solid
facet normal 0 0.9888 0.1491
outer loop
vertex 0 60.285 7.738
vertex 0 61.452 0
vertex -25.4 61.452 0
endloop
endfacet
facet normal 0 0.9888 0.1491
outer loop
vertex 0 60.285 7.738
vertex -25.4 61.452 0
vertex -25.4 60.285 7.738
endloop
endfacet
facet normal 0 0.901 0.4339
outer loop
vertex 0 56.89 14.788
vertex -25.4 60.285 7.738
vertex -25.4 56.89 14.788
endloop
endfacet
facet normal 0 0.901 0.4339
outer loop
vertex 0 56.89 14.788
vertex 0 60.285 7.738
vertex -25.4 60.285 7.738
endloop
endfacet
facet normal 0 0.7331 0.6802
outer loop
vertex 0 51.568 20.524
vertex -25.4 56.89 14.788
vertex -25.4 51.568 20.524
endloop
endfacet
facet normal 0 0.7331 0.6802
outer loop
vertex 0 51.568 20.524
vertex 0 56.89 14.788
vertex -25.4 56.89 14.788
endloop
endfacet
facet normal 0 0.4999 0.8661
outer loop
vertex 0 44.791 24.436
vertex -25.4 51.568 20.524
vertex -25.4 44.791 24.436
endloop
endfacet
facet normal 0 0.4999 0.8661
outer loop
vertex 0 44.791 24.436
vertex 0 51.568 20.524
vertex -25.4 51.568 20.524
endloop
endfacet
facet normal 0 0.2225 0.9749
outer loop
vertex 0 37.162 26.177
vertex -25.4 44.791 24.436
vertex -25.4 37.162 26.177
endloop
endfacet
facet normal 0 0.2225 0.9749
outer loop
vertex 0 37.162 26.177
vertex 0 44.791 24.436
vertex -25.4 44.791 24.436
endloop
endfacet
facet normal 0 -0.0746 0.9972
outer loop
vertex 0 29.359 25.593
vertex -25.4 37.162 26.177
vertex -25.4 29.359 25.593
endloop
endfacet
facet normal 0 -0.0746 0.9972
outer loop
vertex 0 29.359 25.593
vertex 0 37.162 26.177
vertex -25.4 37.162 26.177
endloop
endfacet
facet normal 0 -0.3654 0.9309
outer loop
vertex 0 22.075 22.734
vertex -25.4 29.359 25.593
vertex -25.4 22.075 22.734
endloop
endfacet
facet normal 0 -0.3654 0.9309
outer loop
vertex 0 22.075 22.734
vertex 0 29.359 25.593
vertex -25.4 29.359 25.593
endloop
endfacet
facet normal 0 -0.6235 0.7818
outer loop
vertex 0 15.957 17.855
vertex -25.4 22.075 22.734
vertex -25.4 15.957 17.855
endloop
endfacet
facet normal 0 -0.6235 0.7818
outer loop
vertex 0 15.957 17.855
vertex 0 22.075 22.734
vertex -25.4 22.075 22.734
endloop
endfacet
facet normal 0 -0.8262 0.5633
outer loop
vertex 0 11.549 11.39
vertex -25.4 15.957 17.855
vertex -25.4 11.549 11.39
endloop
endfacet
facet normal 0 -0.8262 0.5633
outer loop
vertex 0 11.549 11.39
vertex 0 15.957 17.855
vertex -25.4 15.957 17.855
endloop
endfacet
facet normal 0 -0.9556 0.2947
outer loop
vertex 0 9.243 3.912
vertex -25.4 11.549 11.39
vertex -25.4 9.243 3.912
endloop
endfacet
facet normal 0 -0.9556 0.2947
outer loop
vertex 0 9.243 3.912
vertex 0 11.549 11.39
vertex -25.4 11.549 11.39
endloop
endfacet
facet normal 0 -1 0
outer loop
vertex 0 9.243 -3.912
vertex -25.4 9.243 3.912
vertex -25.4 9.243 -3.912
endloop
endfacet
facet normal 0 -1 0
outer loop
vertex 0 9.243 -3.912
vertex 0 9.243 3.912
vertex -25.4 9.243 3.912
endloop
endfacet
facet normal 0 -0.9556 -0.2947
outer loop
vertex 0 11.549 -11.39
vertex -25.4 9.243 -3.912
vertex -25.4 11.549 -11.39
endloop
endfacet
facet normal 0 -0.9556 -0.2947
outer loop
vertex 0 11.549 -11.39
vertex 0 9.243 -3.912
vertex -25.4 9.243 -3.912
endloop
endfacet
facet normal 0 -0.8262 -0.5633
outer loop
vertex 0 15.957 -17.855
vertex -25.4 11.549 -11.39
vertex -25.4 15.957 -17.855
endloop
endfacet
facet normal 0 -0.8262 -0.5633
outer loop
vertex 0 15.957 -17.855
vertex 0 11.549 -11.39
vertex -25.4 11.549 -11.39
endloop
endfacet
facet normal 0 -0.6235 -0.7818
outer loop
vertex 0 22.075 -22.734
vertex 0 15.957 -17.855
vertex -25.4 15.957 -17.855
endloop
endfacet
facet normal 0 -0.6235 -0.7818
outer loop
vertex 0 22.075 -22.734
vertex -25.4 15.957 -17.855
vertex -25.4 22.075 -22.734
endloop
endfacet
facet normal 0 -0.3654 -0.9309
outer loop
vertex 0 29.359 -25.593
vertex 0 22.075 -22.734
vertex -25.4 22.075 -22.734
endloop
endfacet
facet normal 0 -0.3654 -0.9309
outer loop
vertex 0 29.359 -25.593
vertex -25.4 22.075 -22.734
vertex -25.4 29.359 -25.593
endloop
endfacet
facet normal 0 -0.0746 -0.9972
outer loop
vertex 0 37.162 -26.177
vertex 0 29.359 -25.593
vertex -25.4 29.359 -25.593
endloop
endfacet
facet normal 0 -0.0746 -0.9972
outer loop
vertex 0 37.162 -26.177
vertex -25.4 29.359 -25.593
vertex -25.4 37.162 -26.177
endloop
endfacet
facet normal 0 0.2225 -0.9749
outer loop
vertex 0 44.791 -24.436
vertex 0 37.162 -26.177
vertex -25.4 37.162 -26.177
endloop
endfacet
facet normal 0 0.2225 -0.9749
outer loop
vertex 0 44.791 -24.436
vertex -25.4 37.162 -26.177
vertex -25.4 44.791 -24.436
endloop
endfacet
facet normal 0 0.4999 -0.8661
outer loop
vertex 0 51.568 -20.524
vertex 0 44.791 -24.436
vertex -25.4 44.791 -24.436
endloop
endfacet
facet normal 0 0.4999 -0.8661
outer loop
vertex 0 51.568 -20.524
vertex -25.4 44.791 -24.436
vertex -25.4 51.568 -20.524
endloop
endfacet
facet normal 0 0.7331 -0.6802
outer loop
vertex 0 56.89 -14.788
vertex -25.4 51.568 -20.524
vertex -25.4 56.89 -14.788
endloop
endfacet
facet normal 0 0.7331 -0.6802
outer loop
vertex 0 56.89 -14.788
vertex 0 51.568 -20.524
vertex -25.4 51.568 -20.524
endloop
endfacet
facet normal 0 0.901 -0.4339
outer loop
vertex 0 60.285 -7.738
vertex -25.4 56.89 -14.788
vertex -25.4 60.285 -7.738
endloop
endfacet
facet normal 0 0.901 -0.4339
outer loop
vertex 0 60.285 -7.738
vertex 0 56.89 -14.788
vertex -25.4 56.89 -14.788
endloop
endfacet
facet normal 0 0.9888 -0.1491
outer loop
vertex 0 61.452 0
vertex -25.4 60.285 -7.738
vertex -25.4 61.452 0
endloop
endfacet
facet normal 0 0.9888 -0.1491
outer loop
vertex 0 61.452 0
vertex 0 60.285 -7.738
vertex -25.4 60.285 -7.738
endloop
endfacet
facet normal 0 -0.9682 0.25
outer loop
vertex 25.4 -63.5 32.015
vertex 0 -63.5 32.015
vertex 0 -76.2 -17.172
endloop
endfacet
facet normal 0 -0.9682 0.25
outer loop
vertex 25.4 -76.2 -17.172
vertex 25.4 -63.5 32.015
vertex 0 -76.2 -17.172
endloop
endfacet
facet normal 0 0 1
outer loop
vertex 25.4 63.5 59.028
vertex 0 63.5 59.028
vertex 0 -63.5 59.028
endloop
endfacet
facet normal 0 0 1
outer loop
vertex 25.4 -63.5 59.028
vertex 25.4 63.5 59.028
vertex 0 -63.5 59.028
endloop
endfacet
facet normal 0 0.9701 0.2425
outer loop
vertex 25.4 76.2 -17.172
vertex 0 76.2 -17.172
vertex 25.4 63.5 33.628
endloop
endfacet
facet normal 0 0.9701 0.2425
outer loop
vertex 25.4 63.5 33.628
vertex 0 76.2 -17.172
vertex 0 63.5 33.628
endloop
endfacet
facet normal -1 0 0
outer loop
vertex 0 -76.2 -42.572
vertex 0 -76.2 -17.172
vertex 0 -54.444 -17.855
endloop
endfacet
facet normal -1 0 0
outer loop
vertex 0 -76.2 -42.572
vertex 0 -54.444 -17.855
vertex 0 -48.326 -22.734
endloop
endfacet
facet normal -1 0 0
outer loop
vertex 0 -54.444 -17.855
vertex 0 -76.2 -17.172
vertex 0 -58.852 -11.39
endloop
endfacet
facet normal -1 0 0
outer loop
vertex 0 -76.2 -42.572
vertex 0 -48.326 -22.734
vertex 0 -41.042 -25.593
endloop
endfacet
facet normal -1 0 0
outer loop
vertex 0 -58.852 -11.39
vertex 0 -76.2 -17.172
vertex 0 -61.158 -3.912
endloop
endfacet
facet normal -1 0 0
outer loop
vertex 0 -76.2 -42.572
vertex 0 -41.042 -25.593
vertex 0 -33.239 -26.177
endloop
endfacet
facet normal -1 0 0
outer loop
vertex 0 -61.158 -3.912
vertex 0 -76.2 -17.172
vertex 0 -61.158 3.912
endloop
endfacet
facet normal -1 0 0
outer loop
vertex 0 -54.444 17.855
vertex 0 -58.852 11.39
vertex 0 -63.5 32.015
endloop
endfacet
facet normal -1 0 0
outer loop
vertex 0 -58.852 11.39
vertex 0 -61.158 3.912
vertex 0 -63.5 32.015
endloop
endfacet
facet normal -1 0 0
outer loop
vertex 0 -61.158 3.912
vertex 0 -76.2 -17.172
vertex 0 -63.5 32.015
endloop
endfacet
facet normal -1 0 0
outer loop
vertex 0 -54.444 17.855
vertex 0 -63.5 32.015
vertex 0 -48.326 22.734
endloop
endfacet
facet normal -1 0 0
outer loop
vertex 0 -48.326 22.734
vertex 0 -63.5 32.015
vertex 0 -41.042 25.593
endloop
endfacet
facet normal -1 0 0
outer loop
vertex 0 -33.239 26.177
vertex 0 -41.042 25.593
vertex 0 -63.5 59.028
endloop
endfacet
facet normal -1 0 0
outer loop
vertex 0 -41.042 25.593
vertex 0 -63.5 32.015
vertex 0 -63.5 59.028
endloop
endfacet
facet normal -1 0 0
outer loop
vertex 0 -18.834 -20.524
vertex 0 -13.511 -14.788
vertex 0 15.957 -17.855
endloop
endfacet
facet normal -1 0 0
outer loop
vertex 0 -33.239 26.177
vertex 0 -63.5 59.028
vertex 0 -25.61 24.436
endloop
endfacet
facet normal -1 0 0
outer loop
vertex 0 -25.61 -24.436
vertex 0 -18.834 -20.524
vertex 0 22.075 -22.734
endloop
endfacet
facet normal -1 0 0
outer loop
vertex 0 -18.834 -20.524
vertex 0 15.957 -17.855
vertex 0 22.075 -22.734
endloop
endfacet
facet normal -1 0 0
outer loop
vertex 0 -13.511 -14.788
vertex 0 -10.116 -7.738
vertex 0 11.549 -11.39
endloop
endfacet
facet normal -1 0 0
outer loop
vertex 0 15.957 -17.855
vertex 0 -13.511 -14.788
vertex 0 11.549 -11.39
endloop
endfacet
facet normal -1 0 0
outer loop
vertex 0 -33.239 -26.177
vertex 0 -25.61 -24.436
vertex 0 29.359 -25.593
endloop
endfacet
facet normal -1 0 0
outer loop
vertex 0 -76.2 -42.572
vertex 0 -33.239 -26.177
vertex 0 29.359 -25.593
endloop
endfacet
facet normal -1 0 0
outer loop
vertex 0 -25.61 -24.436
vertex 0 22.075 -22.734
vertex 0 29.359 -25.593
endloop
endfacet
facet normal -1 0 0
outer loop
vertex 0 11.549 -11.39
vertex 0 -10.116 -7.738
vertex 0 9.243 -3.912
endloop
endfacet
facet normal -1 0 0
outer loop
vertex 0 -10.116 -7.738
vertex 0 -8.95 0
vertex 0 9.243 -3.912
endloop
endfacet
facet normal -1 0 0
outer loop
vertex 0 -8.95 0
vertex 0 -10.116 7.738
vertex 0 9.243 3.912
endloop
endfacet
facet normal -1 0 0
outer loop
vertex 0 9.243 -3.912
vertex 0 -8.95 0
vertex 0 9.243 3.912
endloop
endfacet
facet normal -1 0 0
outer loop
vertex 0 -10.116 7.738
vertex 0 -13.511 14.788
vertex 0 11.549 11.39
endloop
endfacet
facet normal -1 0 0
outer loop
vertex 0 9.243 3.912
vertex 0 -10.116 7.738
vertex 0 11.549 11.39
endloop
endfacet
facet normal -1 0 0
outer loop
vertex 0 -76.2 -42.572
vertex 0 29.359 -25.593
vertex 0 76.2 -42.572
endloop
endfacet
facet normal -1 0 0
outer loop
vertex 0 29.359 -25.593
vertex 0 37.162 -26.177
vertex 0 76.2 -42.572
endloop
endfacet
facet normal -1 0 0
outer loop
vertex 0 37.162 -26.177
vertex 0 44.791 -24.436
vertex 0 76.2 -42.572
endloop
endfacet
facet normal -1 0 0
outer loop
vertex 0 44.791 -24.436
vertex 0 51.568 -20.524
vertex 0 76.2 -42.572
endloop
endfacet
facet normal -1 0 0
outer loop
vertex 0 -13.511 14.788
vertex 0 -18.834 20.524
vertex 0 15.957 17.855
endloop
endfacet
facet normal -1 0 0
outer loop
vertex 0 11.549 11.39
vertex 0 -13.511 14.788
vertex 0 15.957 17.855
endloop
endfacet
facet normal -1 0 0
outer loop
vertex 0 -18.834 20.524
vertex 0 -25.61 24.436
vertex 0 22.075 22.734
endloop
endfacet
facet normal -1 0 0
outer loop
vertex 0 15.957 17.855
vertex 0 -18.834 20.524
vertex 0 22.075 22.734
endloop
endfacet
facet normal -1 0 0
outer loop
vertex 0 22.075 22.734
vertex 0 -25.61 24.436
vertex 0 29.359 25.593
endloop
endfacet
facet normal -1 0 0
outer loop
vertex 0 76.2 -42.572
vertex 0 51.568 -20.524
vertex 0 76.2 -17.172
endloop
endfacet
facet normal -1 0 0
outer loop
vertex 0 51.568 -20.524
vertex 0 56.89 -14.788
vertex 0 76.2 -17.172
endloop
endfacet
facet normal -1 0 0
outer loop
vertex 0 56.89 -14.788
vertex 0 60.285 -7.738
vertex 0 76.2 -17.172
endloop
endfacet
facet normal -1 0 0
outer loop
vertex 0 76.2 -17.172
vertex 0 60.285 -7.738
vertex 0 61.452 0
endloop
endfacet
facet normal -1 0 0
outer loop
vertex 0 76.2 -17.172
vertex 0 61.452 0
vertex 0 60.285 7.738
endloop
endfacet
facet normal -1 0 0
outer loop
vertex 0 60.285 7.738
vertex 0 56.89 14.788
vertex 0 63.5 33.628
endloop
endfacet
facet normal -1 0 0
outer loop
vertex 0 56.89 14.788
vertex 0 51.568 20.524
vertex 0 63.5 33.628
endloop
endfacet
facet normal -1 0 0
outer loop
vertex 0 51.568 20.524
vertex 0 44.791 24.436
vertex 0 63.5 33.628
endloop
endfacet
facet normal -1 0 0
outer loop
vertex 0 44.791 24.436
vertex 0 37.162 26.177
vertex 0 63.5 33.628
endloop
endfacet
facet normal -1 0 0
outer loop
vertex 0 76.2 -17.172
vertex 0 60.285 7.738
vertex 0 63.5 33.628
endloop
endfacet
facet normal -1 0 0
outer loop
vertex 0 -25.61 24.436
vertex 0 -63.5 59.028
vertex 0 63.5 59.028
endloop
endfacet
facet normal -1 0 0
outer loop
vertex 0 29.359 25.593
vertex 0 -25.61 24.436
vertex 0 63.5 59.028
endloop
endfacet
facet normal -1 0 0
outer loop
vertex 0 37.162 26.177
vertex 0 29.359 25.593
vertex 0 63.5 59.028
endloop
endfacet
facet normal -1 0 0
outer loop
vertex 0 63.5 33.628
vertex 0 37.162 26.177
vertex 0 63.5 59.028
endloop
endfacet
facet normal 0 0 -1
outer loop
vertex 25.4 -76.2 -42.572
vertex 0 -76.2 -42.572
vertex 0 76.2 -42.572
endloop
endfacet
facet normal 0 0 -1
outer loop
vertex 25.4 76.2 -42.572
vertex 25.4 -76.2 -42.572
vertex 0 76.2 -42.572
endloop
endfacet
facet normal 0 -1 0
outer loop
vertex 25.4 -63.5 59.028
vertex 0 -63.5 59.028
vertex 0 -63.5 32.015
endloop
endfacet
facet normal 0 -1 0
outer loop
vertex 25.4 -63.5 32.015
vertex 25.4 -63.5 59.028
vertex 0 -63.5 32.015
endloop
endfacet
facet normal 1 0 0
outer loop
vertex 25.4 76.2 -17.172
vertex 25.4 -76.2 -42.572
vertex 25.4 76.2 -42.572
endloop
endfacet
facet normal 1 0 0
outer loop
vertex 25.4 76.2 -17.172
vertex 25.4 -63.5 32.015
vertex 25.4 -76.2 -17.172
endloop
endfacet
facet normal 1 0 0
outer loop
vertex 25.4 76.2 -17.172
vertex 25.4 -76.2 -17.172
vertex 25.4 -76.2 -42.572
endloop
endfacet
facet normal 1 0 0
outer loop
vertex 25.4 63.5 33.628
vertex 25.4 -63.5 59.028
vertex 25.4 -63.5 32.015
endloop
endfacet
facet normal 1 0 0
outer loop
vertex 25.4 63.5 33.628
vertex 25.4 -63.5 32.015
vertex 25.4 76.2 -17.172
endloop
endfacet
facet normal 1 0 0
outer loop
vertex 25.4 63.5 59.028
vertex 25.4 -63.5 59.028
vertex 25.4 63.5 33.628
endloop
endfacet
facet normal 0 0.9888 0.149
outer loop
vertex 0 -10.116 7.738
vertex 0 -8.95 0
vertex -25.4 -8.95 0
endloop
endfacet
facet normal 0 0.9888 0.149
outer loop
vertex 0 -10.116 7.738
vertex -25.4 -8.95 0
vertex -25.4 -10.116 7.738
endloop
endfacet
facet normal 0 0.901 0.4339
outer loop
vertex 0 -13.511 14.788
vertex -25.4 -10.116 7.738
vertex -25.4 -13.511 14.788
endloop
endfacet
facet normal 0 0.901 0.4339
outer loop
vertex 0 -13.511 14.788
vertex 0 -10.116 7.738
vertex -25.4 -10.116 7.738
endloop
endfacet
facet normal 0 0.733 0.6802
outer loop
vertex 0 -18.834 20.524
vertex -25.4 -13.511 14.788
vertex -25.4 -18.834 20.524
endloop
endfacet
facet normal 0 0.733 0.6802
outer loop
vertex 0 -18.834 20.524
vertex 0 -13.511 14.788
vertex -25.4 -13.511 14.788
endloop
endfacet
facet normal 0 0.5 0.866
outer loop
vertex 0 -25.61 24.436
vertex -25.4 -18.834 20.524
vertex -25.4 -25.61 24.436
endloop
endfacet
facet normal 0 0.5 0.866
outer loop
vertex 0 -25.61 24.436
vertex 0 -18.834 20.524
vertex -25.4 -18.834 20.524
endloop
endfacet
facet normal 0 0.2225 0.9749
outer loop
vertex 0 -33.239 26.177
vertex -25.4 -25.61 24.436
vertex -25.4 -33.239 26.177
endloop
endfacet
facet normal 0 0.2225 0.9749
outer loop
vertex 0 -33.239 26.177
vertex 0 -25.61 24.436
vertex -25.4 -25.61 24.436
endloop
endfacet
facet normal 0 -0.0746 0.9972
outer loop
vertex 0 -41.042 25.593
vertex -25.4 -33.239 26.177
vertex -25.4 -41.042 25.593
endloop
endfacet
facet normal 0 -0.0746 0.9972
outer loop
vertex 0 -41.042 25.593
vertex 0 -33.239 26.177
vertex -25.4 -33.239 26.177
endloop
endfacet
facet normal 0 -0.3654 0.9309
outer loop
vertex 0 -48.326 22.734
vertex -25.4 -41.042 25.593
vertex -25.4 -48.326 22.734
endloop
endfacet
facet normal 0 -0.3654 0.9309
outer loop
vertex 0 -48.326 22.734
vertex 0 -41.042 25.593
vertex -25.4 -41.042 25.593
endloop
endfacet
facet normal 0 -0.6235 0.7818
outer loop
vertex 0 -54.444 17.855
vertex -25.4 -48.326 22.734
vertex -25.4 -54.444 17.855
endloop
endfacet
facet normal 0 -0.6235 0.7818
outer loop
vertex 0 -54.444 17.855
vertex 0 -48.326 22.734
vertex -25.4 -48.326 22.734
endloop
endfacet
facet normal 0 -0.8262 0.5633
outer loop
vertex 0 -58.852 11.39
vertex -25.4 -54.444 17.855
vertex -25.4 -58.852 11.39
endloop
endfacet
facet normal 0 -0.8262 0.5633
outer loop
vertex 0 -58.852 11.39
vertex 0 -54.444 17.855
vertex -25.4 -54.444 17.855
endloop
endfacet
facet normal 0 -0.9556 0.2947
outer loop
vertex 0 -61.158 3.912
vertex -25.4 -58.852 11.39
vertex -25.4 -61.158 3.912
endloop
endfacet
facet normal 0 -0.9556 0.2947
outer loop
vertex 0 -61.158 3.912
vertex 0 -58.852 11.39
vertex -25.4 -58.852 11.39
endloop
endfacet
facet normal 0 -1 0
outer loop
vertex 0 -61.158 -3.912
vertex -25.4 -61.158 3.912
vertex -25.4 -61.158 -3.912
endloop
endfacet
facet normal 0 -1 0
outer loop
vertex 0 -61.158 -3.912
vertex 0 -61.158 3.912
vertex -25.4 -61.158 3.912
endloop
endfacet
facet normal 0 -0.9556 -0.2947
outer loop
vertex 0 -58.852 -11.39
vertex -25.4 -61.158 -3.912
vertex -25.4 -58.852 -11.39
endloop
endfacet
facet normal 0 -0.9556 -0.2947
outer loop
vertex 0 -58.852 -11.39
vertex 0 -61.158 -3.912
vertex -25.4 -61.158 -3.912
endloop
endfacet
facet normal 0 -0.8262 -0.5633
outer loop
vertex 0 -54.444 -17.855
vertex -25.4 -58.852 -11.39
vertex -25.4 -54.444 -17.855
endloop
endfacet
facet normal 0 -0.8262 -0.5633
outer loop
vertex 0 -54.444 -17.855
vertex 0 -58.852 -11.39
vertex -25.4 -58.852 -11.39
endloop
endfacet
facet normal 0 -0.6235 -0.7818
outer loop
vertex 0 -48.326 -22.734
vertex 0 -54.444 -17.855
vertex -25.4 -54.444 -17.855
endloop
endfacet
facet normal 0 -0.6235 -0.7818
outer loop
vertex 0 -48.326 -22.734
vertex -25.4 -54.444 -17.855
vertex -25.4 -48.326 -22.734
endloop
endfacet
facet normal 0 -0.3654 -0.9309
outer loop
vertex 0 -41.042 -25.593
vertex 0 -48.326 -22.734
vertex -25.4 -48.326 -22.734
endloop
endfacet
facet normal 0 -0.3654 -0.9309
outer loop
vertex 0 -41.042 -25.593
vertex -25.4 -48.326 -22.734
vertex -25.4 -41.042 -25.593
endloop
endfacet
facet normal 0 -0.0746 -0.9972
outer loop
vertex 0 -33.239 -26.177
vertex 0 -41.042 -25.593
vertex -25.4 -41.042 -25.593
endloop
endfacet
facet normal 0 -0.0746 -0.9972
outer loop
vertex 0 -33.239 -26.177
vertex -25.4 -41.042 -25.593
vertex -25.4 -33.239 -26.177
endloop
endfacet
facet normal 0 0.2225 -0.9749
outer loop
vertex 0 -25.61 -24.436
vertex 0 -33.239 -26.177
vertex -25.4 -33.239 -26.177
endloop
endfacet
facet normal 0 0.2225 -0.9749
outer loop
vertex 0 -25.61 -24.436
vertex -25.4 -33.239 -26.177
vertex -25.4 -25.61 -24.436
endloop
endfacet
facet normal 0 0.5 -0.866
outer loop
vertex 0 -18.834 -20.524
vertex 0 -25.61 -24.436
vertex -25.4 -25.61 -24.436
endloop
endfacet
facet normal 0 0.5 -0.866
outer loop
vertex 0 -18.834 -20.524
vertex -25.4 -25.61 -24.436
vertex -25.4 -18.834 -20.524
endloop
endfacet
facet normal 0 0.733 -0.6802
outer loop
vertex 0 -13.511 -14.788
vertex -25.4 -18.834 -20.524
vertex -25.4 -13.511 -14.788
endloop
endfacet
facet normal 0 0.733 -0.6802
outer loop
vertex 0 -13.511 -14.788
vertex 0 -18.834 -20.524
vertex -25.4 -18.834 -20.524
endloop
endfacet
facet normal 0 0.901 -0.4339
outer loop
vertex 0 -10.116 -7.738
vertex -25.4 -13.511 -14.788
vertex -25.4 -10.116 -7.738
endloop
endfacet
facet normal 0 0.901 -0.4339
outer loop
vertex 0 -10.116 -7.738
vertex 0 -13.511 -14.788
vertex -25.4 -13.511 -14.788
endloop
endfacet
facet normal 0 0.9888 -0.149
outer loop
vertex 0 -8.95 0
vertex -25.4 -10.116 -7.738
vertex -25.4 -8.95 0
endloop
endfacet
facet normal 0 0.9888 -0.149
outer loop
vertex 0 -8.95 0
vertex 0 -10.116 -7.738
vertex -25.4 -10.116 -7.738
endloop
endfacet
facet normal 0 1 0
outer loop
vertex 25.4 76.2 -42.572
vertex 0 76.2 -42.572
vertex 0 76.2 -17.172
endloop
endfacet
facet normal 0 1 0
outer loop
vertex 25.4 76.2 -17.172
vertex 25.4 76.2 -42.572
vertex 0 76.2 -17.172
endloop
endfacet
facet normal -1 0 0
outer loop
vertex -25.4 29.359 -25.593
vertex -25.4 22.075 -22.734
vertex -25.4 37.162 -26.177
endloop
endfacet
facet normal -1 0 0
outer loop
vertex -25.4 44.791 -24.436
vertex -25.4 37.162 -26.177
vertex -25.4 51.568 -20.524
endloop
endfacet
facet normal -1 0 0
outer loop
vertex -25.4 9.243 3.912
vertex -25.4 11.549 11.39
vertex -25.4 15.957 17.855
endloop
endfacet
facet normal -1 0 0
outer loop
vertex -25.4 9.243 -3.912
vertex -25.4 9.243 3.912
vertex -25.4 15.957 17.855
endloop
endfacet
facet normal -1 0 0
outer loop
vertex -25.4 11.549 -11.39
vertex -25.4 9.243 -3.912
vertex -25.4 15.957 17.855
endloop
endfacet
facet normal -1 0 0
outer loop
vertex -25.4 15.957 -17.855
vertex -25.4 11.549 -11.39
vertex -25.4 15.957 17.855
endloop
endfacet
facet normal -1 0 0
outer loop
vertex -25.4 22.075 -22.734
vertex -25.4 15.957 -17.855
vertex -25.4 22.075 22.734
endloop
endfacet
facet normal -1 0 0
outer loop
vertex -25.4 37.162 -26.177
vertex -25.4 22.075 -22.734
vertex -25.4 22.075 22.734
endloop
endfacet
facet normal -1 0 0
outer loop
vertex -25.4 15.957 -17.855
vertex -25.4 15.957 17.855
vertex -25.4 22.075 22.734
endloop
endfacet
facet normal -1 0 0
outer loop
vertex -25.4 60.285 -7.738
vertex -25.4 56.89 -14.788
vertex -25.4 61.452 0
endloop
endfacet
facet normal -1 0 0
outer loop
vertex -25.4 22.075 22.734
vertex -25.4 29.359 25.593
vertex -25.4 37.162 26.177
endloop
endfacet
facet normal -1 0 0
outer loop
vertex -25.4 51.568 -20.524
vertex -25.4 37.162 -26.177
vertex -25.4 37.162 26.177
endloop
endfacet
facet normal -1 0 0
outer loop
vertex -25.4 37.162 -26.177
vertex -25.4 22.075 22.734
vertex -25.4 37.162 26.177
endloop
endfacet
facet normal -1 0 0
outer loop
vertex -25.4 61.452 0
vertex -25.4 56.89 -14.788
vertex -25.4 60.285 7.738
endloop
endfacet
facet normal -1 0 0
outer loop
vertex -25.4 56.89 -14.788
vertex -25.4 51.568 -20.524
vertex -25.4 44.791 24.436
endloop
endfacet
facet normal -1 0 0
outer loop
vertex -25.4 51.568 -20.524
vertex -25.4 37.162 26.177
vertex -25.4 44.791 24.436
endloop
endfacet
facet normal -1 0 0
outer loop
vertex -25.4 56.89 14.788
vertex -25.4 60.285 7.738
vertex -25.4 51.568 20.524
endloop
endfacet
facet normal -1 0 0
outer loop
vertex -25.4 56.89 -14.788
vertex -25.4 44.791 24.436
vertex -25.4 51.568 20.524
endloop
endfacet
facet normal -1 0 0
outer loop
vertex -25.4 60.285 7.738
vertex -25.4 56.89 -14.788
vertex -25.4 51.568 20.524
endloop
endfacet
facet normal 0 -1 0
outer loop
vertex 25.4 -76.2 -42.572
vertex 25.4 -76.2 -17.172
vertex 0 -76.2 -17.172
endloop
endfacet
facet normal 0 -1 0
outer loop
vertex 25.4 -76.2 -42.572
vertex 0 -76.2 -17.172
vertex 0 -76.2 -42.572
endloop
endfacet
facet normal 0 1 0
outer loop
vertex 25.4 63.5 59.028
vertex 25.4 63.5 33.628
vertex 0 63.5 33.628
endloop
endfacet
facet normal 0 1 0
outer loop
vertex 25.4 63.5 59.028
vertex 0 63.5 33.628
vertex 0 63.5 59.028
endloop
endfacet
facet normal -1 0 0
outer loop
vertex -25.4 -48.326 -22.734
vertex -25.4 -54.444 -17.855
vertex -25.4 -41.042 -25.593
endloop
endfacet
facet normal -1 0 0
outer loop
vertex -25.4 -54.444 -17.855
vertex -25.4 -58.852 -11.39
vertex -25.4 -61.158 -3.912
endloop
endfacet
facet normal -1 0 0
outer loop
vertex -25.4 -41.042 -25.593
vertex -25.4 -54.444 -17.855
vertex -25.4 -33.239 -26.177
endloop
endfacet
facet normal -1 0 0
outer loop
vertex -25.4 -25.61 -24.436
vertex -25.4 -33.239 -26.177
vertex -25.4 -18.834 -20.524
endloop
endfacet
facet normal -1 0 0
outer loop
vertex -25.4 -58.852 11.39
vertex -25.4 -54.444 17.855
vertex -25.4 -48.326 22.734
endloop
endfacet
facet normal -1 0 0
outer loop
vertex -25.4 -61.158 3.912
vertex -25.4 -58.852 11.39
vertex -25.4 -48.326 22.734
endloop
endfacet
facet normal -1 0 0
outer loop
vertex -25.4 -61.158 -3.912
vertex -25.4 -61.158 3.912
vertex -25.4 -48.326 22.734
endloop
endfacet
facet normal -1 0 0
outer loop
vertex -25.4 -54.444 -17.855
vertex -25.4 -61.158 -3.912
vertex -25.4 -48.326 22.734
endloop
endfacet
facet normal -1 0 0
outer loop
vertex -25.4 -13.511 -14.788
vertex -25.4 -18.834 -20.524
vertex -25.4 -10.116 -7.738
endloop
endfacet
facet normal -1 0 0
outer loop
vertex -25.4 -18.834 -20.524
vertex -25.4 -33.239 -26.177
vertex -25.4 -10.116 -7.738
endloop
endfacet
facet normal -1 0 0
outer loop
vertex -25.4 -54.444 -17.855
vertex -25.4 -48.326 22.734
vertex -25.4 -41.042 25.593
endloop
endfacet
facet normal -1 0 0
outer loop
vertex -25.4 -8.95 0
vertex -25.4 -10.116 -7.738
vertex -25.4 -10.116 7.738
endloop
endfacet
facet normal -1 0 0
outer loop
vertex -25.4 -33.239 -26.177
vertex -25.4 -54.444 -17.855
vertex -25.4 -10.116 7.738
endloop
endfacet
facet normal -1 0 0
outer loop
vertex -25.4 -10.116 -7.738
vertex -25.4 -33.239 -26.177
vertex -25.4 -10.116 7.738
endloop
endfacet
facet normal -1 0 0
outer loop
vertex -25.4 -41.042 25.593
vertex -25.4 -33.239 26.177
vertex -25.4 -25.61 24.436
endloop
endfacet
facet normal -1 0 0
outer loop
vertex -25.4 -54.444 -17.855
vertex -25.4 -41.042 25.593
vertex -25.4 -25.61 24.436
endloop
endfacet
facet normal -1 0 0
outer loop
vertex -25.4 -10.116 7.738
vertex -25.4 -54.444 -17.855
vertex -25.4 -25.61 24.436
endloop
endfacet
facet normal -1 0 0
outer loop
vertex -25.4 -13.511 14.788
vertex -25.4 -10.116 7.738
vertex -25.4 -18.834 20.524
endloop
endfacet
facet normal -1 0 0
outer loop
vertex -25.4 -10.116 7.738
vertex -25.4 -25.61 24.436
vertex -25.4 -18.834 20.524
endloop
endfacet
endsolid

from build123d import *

# Parameters (mm, degrees)
F1_DEPTH = 25.4
F2_R     = 26.2509
F3_DEPTH = 25.4


with BuildPart() as f1:
    # F0 (on Right) → F1 (new body)
    with BuildSketch(Plane.YZ):
        Polygon((-76.2, -42.571535), (76.2, -42.571535), (76.2, -17.171535), (63.5, -17.171535), (-63.5, -17.171535), (-76.2, -17.171535), align=None)
        Polygon((63.5, -17.171535), (76.2, -17.171535), (63.5, 33.628465), (63.5, 59.028465), (-63.5, 59.028465), (-63.5, 32.015353), (-76.2, -17.171535), (-63.5, -17.171535), align=None)
    extrude(amount=F1_DEPTH)

    # F2 (on Right) → F3 (join)
    with BuildSketch(Plane.YZ):
        with Locations((35.200721, 0)):
            Circle(F2_R)
        with Locations((-35.200721, 0)):
            Circle(F2_R)
    extrude(amount=-F3_DEPTH)


solid = f1.part
